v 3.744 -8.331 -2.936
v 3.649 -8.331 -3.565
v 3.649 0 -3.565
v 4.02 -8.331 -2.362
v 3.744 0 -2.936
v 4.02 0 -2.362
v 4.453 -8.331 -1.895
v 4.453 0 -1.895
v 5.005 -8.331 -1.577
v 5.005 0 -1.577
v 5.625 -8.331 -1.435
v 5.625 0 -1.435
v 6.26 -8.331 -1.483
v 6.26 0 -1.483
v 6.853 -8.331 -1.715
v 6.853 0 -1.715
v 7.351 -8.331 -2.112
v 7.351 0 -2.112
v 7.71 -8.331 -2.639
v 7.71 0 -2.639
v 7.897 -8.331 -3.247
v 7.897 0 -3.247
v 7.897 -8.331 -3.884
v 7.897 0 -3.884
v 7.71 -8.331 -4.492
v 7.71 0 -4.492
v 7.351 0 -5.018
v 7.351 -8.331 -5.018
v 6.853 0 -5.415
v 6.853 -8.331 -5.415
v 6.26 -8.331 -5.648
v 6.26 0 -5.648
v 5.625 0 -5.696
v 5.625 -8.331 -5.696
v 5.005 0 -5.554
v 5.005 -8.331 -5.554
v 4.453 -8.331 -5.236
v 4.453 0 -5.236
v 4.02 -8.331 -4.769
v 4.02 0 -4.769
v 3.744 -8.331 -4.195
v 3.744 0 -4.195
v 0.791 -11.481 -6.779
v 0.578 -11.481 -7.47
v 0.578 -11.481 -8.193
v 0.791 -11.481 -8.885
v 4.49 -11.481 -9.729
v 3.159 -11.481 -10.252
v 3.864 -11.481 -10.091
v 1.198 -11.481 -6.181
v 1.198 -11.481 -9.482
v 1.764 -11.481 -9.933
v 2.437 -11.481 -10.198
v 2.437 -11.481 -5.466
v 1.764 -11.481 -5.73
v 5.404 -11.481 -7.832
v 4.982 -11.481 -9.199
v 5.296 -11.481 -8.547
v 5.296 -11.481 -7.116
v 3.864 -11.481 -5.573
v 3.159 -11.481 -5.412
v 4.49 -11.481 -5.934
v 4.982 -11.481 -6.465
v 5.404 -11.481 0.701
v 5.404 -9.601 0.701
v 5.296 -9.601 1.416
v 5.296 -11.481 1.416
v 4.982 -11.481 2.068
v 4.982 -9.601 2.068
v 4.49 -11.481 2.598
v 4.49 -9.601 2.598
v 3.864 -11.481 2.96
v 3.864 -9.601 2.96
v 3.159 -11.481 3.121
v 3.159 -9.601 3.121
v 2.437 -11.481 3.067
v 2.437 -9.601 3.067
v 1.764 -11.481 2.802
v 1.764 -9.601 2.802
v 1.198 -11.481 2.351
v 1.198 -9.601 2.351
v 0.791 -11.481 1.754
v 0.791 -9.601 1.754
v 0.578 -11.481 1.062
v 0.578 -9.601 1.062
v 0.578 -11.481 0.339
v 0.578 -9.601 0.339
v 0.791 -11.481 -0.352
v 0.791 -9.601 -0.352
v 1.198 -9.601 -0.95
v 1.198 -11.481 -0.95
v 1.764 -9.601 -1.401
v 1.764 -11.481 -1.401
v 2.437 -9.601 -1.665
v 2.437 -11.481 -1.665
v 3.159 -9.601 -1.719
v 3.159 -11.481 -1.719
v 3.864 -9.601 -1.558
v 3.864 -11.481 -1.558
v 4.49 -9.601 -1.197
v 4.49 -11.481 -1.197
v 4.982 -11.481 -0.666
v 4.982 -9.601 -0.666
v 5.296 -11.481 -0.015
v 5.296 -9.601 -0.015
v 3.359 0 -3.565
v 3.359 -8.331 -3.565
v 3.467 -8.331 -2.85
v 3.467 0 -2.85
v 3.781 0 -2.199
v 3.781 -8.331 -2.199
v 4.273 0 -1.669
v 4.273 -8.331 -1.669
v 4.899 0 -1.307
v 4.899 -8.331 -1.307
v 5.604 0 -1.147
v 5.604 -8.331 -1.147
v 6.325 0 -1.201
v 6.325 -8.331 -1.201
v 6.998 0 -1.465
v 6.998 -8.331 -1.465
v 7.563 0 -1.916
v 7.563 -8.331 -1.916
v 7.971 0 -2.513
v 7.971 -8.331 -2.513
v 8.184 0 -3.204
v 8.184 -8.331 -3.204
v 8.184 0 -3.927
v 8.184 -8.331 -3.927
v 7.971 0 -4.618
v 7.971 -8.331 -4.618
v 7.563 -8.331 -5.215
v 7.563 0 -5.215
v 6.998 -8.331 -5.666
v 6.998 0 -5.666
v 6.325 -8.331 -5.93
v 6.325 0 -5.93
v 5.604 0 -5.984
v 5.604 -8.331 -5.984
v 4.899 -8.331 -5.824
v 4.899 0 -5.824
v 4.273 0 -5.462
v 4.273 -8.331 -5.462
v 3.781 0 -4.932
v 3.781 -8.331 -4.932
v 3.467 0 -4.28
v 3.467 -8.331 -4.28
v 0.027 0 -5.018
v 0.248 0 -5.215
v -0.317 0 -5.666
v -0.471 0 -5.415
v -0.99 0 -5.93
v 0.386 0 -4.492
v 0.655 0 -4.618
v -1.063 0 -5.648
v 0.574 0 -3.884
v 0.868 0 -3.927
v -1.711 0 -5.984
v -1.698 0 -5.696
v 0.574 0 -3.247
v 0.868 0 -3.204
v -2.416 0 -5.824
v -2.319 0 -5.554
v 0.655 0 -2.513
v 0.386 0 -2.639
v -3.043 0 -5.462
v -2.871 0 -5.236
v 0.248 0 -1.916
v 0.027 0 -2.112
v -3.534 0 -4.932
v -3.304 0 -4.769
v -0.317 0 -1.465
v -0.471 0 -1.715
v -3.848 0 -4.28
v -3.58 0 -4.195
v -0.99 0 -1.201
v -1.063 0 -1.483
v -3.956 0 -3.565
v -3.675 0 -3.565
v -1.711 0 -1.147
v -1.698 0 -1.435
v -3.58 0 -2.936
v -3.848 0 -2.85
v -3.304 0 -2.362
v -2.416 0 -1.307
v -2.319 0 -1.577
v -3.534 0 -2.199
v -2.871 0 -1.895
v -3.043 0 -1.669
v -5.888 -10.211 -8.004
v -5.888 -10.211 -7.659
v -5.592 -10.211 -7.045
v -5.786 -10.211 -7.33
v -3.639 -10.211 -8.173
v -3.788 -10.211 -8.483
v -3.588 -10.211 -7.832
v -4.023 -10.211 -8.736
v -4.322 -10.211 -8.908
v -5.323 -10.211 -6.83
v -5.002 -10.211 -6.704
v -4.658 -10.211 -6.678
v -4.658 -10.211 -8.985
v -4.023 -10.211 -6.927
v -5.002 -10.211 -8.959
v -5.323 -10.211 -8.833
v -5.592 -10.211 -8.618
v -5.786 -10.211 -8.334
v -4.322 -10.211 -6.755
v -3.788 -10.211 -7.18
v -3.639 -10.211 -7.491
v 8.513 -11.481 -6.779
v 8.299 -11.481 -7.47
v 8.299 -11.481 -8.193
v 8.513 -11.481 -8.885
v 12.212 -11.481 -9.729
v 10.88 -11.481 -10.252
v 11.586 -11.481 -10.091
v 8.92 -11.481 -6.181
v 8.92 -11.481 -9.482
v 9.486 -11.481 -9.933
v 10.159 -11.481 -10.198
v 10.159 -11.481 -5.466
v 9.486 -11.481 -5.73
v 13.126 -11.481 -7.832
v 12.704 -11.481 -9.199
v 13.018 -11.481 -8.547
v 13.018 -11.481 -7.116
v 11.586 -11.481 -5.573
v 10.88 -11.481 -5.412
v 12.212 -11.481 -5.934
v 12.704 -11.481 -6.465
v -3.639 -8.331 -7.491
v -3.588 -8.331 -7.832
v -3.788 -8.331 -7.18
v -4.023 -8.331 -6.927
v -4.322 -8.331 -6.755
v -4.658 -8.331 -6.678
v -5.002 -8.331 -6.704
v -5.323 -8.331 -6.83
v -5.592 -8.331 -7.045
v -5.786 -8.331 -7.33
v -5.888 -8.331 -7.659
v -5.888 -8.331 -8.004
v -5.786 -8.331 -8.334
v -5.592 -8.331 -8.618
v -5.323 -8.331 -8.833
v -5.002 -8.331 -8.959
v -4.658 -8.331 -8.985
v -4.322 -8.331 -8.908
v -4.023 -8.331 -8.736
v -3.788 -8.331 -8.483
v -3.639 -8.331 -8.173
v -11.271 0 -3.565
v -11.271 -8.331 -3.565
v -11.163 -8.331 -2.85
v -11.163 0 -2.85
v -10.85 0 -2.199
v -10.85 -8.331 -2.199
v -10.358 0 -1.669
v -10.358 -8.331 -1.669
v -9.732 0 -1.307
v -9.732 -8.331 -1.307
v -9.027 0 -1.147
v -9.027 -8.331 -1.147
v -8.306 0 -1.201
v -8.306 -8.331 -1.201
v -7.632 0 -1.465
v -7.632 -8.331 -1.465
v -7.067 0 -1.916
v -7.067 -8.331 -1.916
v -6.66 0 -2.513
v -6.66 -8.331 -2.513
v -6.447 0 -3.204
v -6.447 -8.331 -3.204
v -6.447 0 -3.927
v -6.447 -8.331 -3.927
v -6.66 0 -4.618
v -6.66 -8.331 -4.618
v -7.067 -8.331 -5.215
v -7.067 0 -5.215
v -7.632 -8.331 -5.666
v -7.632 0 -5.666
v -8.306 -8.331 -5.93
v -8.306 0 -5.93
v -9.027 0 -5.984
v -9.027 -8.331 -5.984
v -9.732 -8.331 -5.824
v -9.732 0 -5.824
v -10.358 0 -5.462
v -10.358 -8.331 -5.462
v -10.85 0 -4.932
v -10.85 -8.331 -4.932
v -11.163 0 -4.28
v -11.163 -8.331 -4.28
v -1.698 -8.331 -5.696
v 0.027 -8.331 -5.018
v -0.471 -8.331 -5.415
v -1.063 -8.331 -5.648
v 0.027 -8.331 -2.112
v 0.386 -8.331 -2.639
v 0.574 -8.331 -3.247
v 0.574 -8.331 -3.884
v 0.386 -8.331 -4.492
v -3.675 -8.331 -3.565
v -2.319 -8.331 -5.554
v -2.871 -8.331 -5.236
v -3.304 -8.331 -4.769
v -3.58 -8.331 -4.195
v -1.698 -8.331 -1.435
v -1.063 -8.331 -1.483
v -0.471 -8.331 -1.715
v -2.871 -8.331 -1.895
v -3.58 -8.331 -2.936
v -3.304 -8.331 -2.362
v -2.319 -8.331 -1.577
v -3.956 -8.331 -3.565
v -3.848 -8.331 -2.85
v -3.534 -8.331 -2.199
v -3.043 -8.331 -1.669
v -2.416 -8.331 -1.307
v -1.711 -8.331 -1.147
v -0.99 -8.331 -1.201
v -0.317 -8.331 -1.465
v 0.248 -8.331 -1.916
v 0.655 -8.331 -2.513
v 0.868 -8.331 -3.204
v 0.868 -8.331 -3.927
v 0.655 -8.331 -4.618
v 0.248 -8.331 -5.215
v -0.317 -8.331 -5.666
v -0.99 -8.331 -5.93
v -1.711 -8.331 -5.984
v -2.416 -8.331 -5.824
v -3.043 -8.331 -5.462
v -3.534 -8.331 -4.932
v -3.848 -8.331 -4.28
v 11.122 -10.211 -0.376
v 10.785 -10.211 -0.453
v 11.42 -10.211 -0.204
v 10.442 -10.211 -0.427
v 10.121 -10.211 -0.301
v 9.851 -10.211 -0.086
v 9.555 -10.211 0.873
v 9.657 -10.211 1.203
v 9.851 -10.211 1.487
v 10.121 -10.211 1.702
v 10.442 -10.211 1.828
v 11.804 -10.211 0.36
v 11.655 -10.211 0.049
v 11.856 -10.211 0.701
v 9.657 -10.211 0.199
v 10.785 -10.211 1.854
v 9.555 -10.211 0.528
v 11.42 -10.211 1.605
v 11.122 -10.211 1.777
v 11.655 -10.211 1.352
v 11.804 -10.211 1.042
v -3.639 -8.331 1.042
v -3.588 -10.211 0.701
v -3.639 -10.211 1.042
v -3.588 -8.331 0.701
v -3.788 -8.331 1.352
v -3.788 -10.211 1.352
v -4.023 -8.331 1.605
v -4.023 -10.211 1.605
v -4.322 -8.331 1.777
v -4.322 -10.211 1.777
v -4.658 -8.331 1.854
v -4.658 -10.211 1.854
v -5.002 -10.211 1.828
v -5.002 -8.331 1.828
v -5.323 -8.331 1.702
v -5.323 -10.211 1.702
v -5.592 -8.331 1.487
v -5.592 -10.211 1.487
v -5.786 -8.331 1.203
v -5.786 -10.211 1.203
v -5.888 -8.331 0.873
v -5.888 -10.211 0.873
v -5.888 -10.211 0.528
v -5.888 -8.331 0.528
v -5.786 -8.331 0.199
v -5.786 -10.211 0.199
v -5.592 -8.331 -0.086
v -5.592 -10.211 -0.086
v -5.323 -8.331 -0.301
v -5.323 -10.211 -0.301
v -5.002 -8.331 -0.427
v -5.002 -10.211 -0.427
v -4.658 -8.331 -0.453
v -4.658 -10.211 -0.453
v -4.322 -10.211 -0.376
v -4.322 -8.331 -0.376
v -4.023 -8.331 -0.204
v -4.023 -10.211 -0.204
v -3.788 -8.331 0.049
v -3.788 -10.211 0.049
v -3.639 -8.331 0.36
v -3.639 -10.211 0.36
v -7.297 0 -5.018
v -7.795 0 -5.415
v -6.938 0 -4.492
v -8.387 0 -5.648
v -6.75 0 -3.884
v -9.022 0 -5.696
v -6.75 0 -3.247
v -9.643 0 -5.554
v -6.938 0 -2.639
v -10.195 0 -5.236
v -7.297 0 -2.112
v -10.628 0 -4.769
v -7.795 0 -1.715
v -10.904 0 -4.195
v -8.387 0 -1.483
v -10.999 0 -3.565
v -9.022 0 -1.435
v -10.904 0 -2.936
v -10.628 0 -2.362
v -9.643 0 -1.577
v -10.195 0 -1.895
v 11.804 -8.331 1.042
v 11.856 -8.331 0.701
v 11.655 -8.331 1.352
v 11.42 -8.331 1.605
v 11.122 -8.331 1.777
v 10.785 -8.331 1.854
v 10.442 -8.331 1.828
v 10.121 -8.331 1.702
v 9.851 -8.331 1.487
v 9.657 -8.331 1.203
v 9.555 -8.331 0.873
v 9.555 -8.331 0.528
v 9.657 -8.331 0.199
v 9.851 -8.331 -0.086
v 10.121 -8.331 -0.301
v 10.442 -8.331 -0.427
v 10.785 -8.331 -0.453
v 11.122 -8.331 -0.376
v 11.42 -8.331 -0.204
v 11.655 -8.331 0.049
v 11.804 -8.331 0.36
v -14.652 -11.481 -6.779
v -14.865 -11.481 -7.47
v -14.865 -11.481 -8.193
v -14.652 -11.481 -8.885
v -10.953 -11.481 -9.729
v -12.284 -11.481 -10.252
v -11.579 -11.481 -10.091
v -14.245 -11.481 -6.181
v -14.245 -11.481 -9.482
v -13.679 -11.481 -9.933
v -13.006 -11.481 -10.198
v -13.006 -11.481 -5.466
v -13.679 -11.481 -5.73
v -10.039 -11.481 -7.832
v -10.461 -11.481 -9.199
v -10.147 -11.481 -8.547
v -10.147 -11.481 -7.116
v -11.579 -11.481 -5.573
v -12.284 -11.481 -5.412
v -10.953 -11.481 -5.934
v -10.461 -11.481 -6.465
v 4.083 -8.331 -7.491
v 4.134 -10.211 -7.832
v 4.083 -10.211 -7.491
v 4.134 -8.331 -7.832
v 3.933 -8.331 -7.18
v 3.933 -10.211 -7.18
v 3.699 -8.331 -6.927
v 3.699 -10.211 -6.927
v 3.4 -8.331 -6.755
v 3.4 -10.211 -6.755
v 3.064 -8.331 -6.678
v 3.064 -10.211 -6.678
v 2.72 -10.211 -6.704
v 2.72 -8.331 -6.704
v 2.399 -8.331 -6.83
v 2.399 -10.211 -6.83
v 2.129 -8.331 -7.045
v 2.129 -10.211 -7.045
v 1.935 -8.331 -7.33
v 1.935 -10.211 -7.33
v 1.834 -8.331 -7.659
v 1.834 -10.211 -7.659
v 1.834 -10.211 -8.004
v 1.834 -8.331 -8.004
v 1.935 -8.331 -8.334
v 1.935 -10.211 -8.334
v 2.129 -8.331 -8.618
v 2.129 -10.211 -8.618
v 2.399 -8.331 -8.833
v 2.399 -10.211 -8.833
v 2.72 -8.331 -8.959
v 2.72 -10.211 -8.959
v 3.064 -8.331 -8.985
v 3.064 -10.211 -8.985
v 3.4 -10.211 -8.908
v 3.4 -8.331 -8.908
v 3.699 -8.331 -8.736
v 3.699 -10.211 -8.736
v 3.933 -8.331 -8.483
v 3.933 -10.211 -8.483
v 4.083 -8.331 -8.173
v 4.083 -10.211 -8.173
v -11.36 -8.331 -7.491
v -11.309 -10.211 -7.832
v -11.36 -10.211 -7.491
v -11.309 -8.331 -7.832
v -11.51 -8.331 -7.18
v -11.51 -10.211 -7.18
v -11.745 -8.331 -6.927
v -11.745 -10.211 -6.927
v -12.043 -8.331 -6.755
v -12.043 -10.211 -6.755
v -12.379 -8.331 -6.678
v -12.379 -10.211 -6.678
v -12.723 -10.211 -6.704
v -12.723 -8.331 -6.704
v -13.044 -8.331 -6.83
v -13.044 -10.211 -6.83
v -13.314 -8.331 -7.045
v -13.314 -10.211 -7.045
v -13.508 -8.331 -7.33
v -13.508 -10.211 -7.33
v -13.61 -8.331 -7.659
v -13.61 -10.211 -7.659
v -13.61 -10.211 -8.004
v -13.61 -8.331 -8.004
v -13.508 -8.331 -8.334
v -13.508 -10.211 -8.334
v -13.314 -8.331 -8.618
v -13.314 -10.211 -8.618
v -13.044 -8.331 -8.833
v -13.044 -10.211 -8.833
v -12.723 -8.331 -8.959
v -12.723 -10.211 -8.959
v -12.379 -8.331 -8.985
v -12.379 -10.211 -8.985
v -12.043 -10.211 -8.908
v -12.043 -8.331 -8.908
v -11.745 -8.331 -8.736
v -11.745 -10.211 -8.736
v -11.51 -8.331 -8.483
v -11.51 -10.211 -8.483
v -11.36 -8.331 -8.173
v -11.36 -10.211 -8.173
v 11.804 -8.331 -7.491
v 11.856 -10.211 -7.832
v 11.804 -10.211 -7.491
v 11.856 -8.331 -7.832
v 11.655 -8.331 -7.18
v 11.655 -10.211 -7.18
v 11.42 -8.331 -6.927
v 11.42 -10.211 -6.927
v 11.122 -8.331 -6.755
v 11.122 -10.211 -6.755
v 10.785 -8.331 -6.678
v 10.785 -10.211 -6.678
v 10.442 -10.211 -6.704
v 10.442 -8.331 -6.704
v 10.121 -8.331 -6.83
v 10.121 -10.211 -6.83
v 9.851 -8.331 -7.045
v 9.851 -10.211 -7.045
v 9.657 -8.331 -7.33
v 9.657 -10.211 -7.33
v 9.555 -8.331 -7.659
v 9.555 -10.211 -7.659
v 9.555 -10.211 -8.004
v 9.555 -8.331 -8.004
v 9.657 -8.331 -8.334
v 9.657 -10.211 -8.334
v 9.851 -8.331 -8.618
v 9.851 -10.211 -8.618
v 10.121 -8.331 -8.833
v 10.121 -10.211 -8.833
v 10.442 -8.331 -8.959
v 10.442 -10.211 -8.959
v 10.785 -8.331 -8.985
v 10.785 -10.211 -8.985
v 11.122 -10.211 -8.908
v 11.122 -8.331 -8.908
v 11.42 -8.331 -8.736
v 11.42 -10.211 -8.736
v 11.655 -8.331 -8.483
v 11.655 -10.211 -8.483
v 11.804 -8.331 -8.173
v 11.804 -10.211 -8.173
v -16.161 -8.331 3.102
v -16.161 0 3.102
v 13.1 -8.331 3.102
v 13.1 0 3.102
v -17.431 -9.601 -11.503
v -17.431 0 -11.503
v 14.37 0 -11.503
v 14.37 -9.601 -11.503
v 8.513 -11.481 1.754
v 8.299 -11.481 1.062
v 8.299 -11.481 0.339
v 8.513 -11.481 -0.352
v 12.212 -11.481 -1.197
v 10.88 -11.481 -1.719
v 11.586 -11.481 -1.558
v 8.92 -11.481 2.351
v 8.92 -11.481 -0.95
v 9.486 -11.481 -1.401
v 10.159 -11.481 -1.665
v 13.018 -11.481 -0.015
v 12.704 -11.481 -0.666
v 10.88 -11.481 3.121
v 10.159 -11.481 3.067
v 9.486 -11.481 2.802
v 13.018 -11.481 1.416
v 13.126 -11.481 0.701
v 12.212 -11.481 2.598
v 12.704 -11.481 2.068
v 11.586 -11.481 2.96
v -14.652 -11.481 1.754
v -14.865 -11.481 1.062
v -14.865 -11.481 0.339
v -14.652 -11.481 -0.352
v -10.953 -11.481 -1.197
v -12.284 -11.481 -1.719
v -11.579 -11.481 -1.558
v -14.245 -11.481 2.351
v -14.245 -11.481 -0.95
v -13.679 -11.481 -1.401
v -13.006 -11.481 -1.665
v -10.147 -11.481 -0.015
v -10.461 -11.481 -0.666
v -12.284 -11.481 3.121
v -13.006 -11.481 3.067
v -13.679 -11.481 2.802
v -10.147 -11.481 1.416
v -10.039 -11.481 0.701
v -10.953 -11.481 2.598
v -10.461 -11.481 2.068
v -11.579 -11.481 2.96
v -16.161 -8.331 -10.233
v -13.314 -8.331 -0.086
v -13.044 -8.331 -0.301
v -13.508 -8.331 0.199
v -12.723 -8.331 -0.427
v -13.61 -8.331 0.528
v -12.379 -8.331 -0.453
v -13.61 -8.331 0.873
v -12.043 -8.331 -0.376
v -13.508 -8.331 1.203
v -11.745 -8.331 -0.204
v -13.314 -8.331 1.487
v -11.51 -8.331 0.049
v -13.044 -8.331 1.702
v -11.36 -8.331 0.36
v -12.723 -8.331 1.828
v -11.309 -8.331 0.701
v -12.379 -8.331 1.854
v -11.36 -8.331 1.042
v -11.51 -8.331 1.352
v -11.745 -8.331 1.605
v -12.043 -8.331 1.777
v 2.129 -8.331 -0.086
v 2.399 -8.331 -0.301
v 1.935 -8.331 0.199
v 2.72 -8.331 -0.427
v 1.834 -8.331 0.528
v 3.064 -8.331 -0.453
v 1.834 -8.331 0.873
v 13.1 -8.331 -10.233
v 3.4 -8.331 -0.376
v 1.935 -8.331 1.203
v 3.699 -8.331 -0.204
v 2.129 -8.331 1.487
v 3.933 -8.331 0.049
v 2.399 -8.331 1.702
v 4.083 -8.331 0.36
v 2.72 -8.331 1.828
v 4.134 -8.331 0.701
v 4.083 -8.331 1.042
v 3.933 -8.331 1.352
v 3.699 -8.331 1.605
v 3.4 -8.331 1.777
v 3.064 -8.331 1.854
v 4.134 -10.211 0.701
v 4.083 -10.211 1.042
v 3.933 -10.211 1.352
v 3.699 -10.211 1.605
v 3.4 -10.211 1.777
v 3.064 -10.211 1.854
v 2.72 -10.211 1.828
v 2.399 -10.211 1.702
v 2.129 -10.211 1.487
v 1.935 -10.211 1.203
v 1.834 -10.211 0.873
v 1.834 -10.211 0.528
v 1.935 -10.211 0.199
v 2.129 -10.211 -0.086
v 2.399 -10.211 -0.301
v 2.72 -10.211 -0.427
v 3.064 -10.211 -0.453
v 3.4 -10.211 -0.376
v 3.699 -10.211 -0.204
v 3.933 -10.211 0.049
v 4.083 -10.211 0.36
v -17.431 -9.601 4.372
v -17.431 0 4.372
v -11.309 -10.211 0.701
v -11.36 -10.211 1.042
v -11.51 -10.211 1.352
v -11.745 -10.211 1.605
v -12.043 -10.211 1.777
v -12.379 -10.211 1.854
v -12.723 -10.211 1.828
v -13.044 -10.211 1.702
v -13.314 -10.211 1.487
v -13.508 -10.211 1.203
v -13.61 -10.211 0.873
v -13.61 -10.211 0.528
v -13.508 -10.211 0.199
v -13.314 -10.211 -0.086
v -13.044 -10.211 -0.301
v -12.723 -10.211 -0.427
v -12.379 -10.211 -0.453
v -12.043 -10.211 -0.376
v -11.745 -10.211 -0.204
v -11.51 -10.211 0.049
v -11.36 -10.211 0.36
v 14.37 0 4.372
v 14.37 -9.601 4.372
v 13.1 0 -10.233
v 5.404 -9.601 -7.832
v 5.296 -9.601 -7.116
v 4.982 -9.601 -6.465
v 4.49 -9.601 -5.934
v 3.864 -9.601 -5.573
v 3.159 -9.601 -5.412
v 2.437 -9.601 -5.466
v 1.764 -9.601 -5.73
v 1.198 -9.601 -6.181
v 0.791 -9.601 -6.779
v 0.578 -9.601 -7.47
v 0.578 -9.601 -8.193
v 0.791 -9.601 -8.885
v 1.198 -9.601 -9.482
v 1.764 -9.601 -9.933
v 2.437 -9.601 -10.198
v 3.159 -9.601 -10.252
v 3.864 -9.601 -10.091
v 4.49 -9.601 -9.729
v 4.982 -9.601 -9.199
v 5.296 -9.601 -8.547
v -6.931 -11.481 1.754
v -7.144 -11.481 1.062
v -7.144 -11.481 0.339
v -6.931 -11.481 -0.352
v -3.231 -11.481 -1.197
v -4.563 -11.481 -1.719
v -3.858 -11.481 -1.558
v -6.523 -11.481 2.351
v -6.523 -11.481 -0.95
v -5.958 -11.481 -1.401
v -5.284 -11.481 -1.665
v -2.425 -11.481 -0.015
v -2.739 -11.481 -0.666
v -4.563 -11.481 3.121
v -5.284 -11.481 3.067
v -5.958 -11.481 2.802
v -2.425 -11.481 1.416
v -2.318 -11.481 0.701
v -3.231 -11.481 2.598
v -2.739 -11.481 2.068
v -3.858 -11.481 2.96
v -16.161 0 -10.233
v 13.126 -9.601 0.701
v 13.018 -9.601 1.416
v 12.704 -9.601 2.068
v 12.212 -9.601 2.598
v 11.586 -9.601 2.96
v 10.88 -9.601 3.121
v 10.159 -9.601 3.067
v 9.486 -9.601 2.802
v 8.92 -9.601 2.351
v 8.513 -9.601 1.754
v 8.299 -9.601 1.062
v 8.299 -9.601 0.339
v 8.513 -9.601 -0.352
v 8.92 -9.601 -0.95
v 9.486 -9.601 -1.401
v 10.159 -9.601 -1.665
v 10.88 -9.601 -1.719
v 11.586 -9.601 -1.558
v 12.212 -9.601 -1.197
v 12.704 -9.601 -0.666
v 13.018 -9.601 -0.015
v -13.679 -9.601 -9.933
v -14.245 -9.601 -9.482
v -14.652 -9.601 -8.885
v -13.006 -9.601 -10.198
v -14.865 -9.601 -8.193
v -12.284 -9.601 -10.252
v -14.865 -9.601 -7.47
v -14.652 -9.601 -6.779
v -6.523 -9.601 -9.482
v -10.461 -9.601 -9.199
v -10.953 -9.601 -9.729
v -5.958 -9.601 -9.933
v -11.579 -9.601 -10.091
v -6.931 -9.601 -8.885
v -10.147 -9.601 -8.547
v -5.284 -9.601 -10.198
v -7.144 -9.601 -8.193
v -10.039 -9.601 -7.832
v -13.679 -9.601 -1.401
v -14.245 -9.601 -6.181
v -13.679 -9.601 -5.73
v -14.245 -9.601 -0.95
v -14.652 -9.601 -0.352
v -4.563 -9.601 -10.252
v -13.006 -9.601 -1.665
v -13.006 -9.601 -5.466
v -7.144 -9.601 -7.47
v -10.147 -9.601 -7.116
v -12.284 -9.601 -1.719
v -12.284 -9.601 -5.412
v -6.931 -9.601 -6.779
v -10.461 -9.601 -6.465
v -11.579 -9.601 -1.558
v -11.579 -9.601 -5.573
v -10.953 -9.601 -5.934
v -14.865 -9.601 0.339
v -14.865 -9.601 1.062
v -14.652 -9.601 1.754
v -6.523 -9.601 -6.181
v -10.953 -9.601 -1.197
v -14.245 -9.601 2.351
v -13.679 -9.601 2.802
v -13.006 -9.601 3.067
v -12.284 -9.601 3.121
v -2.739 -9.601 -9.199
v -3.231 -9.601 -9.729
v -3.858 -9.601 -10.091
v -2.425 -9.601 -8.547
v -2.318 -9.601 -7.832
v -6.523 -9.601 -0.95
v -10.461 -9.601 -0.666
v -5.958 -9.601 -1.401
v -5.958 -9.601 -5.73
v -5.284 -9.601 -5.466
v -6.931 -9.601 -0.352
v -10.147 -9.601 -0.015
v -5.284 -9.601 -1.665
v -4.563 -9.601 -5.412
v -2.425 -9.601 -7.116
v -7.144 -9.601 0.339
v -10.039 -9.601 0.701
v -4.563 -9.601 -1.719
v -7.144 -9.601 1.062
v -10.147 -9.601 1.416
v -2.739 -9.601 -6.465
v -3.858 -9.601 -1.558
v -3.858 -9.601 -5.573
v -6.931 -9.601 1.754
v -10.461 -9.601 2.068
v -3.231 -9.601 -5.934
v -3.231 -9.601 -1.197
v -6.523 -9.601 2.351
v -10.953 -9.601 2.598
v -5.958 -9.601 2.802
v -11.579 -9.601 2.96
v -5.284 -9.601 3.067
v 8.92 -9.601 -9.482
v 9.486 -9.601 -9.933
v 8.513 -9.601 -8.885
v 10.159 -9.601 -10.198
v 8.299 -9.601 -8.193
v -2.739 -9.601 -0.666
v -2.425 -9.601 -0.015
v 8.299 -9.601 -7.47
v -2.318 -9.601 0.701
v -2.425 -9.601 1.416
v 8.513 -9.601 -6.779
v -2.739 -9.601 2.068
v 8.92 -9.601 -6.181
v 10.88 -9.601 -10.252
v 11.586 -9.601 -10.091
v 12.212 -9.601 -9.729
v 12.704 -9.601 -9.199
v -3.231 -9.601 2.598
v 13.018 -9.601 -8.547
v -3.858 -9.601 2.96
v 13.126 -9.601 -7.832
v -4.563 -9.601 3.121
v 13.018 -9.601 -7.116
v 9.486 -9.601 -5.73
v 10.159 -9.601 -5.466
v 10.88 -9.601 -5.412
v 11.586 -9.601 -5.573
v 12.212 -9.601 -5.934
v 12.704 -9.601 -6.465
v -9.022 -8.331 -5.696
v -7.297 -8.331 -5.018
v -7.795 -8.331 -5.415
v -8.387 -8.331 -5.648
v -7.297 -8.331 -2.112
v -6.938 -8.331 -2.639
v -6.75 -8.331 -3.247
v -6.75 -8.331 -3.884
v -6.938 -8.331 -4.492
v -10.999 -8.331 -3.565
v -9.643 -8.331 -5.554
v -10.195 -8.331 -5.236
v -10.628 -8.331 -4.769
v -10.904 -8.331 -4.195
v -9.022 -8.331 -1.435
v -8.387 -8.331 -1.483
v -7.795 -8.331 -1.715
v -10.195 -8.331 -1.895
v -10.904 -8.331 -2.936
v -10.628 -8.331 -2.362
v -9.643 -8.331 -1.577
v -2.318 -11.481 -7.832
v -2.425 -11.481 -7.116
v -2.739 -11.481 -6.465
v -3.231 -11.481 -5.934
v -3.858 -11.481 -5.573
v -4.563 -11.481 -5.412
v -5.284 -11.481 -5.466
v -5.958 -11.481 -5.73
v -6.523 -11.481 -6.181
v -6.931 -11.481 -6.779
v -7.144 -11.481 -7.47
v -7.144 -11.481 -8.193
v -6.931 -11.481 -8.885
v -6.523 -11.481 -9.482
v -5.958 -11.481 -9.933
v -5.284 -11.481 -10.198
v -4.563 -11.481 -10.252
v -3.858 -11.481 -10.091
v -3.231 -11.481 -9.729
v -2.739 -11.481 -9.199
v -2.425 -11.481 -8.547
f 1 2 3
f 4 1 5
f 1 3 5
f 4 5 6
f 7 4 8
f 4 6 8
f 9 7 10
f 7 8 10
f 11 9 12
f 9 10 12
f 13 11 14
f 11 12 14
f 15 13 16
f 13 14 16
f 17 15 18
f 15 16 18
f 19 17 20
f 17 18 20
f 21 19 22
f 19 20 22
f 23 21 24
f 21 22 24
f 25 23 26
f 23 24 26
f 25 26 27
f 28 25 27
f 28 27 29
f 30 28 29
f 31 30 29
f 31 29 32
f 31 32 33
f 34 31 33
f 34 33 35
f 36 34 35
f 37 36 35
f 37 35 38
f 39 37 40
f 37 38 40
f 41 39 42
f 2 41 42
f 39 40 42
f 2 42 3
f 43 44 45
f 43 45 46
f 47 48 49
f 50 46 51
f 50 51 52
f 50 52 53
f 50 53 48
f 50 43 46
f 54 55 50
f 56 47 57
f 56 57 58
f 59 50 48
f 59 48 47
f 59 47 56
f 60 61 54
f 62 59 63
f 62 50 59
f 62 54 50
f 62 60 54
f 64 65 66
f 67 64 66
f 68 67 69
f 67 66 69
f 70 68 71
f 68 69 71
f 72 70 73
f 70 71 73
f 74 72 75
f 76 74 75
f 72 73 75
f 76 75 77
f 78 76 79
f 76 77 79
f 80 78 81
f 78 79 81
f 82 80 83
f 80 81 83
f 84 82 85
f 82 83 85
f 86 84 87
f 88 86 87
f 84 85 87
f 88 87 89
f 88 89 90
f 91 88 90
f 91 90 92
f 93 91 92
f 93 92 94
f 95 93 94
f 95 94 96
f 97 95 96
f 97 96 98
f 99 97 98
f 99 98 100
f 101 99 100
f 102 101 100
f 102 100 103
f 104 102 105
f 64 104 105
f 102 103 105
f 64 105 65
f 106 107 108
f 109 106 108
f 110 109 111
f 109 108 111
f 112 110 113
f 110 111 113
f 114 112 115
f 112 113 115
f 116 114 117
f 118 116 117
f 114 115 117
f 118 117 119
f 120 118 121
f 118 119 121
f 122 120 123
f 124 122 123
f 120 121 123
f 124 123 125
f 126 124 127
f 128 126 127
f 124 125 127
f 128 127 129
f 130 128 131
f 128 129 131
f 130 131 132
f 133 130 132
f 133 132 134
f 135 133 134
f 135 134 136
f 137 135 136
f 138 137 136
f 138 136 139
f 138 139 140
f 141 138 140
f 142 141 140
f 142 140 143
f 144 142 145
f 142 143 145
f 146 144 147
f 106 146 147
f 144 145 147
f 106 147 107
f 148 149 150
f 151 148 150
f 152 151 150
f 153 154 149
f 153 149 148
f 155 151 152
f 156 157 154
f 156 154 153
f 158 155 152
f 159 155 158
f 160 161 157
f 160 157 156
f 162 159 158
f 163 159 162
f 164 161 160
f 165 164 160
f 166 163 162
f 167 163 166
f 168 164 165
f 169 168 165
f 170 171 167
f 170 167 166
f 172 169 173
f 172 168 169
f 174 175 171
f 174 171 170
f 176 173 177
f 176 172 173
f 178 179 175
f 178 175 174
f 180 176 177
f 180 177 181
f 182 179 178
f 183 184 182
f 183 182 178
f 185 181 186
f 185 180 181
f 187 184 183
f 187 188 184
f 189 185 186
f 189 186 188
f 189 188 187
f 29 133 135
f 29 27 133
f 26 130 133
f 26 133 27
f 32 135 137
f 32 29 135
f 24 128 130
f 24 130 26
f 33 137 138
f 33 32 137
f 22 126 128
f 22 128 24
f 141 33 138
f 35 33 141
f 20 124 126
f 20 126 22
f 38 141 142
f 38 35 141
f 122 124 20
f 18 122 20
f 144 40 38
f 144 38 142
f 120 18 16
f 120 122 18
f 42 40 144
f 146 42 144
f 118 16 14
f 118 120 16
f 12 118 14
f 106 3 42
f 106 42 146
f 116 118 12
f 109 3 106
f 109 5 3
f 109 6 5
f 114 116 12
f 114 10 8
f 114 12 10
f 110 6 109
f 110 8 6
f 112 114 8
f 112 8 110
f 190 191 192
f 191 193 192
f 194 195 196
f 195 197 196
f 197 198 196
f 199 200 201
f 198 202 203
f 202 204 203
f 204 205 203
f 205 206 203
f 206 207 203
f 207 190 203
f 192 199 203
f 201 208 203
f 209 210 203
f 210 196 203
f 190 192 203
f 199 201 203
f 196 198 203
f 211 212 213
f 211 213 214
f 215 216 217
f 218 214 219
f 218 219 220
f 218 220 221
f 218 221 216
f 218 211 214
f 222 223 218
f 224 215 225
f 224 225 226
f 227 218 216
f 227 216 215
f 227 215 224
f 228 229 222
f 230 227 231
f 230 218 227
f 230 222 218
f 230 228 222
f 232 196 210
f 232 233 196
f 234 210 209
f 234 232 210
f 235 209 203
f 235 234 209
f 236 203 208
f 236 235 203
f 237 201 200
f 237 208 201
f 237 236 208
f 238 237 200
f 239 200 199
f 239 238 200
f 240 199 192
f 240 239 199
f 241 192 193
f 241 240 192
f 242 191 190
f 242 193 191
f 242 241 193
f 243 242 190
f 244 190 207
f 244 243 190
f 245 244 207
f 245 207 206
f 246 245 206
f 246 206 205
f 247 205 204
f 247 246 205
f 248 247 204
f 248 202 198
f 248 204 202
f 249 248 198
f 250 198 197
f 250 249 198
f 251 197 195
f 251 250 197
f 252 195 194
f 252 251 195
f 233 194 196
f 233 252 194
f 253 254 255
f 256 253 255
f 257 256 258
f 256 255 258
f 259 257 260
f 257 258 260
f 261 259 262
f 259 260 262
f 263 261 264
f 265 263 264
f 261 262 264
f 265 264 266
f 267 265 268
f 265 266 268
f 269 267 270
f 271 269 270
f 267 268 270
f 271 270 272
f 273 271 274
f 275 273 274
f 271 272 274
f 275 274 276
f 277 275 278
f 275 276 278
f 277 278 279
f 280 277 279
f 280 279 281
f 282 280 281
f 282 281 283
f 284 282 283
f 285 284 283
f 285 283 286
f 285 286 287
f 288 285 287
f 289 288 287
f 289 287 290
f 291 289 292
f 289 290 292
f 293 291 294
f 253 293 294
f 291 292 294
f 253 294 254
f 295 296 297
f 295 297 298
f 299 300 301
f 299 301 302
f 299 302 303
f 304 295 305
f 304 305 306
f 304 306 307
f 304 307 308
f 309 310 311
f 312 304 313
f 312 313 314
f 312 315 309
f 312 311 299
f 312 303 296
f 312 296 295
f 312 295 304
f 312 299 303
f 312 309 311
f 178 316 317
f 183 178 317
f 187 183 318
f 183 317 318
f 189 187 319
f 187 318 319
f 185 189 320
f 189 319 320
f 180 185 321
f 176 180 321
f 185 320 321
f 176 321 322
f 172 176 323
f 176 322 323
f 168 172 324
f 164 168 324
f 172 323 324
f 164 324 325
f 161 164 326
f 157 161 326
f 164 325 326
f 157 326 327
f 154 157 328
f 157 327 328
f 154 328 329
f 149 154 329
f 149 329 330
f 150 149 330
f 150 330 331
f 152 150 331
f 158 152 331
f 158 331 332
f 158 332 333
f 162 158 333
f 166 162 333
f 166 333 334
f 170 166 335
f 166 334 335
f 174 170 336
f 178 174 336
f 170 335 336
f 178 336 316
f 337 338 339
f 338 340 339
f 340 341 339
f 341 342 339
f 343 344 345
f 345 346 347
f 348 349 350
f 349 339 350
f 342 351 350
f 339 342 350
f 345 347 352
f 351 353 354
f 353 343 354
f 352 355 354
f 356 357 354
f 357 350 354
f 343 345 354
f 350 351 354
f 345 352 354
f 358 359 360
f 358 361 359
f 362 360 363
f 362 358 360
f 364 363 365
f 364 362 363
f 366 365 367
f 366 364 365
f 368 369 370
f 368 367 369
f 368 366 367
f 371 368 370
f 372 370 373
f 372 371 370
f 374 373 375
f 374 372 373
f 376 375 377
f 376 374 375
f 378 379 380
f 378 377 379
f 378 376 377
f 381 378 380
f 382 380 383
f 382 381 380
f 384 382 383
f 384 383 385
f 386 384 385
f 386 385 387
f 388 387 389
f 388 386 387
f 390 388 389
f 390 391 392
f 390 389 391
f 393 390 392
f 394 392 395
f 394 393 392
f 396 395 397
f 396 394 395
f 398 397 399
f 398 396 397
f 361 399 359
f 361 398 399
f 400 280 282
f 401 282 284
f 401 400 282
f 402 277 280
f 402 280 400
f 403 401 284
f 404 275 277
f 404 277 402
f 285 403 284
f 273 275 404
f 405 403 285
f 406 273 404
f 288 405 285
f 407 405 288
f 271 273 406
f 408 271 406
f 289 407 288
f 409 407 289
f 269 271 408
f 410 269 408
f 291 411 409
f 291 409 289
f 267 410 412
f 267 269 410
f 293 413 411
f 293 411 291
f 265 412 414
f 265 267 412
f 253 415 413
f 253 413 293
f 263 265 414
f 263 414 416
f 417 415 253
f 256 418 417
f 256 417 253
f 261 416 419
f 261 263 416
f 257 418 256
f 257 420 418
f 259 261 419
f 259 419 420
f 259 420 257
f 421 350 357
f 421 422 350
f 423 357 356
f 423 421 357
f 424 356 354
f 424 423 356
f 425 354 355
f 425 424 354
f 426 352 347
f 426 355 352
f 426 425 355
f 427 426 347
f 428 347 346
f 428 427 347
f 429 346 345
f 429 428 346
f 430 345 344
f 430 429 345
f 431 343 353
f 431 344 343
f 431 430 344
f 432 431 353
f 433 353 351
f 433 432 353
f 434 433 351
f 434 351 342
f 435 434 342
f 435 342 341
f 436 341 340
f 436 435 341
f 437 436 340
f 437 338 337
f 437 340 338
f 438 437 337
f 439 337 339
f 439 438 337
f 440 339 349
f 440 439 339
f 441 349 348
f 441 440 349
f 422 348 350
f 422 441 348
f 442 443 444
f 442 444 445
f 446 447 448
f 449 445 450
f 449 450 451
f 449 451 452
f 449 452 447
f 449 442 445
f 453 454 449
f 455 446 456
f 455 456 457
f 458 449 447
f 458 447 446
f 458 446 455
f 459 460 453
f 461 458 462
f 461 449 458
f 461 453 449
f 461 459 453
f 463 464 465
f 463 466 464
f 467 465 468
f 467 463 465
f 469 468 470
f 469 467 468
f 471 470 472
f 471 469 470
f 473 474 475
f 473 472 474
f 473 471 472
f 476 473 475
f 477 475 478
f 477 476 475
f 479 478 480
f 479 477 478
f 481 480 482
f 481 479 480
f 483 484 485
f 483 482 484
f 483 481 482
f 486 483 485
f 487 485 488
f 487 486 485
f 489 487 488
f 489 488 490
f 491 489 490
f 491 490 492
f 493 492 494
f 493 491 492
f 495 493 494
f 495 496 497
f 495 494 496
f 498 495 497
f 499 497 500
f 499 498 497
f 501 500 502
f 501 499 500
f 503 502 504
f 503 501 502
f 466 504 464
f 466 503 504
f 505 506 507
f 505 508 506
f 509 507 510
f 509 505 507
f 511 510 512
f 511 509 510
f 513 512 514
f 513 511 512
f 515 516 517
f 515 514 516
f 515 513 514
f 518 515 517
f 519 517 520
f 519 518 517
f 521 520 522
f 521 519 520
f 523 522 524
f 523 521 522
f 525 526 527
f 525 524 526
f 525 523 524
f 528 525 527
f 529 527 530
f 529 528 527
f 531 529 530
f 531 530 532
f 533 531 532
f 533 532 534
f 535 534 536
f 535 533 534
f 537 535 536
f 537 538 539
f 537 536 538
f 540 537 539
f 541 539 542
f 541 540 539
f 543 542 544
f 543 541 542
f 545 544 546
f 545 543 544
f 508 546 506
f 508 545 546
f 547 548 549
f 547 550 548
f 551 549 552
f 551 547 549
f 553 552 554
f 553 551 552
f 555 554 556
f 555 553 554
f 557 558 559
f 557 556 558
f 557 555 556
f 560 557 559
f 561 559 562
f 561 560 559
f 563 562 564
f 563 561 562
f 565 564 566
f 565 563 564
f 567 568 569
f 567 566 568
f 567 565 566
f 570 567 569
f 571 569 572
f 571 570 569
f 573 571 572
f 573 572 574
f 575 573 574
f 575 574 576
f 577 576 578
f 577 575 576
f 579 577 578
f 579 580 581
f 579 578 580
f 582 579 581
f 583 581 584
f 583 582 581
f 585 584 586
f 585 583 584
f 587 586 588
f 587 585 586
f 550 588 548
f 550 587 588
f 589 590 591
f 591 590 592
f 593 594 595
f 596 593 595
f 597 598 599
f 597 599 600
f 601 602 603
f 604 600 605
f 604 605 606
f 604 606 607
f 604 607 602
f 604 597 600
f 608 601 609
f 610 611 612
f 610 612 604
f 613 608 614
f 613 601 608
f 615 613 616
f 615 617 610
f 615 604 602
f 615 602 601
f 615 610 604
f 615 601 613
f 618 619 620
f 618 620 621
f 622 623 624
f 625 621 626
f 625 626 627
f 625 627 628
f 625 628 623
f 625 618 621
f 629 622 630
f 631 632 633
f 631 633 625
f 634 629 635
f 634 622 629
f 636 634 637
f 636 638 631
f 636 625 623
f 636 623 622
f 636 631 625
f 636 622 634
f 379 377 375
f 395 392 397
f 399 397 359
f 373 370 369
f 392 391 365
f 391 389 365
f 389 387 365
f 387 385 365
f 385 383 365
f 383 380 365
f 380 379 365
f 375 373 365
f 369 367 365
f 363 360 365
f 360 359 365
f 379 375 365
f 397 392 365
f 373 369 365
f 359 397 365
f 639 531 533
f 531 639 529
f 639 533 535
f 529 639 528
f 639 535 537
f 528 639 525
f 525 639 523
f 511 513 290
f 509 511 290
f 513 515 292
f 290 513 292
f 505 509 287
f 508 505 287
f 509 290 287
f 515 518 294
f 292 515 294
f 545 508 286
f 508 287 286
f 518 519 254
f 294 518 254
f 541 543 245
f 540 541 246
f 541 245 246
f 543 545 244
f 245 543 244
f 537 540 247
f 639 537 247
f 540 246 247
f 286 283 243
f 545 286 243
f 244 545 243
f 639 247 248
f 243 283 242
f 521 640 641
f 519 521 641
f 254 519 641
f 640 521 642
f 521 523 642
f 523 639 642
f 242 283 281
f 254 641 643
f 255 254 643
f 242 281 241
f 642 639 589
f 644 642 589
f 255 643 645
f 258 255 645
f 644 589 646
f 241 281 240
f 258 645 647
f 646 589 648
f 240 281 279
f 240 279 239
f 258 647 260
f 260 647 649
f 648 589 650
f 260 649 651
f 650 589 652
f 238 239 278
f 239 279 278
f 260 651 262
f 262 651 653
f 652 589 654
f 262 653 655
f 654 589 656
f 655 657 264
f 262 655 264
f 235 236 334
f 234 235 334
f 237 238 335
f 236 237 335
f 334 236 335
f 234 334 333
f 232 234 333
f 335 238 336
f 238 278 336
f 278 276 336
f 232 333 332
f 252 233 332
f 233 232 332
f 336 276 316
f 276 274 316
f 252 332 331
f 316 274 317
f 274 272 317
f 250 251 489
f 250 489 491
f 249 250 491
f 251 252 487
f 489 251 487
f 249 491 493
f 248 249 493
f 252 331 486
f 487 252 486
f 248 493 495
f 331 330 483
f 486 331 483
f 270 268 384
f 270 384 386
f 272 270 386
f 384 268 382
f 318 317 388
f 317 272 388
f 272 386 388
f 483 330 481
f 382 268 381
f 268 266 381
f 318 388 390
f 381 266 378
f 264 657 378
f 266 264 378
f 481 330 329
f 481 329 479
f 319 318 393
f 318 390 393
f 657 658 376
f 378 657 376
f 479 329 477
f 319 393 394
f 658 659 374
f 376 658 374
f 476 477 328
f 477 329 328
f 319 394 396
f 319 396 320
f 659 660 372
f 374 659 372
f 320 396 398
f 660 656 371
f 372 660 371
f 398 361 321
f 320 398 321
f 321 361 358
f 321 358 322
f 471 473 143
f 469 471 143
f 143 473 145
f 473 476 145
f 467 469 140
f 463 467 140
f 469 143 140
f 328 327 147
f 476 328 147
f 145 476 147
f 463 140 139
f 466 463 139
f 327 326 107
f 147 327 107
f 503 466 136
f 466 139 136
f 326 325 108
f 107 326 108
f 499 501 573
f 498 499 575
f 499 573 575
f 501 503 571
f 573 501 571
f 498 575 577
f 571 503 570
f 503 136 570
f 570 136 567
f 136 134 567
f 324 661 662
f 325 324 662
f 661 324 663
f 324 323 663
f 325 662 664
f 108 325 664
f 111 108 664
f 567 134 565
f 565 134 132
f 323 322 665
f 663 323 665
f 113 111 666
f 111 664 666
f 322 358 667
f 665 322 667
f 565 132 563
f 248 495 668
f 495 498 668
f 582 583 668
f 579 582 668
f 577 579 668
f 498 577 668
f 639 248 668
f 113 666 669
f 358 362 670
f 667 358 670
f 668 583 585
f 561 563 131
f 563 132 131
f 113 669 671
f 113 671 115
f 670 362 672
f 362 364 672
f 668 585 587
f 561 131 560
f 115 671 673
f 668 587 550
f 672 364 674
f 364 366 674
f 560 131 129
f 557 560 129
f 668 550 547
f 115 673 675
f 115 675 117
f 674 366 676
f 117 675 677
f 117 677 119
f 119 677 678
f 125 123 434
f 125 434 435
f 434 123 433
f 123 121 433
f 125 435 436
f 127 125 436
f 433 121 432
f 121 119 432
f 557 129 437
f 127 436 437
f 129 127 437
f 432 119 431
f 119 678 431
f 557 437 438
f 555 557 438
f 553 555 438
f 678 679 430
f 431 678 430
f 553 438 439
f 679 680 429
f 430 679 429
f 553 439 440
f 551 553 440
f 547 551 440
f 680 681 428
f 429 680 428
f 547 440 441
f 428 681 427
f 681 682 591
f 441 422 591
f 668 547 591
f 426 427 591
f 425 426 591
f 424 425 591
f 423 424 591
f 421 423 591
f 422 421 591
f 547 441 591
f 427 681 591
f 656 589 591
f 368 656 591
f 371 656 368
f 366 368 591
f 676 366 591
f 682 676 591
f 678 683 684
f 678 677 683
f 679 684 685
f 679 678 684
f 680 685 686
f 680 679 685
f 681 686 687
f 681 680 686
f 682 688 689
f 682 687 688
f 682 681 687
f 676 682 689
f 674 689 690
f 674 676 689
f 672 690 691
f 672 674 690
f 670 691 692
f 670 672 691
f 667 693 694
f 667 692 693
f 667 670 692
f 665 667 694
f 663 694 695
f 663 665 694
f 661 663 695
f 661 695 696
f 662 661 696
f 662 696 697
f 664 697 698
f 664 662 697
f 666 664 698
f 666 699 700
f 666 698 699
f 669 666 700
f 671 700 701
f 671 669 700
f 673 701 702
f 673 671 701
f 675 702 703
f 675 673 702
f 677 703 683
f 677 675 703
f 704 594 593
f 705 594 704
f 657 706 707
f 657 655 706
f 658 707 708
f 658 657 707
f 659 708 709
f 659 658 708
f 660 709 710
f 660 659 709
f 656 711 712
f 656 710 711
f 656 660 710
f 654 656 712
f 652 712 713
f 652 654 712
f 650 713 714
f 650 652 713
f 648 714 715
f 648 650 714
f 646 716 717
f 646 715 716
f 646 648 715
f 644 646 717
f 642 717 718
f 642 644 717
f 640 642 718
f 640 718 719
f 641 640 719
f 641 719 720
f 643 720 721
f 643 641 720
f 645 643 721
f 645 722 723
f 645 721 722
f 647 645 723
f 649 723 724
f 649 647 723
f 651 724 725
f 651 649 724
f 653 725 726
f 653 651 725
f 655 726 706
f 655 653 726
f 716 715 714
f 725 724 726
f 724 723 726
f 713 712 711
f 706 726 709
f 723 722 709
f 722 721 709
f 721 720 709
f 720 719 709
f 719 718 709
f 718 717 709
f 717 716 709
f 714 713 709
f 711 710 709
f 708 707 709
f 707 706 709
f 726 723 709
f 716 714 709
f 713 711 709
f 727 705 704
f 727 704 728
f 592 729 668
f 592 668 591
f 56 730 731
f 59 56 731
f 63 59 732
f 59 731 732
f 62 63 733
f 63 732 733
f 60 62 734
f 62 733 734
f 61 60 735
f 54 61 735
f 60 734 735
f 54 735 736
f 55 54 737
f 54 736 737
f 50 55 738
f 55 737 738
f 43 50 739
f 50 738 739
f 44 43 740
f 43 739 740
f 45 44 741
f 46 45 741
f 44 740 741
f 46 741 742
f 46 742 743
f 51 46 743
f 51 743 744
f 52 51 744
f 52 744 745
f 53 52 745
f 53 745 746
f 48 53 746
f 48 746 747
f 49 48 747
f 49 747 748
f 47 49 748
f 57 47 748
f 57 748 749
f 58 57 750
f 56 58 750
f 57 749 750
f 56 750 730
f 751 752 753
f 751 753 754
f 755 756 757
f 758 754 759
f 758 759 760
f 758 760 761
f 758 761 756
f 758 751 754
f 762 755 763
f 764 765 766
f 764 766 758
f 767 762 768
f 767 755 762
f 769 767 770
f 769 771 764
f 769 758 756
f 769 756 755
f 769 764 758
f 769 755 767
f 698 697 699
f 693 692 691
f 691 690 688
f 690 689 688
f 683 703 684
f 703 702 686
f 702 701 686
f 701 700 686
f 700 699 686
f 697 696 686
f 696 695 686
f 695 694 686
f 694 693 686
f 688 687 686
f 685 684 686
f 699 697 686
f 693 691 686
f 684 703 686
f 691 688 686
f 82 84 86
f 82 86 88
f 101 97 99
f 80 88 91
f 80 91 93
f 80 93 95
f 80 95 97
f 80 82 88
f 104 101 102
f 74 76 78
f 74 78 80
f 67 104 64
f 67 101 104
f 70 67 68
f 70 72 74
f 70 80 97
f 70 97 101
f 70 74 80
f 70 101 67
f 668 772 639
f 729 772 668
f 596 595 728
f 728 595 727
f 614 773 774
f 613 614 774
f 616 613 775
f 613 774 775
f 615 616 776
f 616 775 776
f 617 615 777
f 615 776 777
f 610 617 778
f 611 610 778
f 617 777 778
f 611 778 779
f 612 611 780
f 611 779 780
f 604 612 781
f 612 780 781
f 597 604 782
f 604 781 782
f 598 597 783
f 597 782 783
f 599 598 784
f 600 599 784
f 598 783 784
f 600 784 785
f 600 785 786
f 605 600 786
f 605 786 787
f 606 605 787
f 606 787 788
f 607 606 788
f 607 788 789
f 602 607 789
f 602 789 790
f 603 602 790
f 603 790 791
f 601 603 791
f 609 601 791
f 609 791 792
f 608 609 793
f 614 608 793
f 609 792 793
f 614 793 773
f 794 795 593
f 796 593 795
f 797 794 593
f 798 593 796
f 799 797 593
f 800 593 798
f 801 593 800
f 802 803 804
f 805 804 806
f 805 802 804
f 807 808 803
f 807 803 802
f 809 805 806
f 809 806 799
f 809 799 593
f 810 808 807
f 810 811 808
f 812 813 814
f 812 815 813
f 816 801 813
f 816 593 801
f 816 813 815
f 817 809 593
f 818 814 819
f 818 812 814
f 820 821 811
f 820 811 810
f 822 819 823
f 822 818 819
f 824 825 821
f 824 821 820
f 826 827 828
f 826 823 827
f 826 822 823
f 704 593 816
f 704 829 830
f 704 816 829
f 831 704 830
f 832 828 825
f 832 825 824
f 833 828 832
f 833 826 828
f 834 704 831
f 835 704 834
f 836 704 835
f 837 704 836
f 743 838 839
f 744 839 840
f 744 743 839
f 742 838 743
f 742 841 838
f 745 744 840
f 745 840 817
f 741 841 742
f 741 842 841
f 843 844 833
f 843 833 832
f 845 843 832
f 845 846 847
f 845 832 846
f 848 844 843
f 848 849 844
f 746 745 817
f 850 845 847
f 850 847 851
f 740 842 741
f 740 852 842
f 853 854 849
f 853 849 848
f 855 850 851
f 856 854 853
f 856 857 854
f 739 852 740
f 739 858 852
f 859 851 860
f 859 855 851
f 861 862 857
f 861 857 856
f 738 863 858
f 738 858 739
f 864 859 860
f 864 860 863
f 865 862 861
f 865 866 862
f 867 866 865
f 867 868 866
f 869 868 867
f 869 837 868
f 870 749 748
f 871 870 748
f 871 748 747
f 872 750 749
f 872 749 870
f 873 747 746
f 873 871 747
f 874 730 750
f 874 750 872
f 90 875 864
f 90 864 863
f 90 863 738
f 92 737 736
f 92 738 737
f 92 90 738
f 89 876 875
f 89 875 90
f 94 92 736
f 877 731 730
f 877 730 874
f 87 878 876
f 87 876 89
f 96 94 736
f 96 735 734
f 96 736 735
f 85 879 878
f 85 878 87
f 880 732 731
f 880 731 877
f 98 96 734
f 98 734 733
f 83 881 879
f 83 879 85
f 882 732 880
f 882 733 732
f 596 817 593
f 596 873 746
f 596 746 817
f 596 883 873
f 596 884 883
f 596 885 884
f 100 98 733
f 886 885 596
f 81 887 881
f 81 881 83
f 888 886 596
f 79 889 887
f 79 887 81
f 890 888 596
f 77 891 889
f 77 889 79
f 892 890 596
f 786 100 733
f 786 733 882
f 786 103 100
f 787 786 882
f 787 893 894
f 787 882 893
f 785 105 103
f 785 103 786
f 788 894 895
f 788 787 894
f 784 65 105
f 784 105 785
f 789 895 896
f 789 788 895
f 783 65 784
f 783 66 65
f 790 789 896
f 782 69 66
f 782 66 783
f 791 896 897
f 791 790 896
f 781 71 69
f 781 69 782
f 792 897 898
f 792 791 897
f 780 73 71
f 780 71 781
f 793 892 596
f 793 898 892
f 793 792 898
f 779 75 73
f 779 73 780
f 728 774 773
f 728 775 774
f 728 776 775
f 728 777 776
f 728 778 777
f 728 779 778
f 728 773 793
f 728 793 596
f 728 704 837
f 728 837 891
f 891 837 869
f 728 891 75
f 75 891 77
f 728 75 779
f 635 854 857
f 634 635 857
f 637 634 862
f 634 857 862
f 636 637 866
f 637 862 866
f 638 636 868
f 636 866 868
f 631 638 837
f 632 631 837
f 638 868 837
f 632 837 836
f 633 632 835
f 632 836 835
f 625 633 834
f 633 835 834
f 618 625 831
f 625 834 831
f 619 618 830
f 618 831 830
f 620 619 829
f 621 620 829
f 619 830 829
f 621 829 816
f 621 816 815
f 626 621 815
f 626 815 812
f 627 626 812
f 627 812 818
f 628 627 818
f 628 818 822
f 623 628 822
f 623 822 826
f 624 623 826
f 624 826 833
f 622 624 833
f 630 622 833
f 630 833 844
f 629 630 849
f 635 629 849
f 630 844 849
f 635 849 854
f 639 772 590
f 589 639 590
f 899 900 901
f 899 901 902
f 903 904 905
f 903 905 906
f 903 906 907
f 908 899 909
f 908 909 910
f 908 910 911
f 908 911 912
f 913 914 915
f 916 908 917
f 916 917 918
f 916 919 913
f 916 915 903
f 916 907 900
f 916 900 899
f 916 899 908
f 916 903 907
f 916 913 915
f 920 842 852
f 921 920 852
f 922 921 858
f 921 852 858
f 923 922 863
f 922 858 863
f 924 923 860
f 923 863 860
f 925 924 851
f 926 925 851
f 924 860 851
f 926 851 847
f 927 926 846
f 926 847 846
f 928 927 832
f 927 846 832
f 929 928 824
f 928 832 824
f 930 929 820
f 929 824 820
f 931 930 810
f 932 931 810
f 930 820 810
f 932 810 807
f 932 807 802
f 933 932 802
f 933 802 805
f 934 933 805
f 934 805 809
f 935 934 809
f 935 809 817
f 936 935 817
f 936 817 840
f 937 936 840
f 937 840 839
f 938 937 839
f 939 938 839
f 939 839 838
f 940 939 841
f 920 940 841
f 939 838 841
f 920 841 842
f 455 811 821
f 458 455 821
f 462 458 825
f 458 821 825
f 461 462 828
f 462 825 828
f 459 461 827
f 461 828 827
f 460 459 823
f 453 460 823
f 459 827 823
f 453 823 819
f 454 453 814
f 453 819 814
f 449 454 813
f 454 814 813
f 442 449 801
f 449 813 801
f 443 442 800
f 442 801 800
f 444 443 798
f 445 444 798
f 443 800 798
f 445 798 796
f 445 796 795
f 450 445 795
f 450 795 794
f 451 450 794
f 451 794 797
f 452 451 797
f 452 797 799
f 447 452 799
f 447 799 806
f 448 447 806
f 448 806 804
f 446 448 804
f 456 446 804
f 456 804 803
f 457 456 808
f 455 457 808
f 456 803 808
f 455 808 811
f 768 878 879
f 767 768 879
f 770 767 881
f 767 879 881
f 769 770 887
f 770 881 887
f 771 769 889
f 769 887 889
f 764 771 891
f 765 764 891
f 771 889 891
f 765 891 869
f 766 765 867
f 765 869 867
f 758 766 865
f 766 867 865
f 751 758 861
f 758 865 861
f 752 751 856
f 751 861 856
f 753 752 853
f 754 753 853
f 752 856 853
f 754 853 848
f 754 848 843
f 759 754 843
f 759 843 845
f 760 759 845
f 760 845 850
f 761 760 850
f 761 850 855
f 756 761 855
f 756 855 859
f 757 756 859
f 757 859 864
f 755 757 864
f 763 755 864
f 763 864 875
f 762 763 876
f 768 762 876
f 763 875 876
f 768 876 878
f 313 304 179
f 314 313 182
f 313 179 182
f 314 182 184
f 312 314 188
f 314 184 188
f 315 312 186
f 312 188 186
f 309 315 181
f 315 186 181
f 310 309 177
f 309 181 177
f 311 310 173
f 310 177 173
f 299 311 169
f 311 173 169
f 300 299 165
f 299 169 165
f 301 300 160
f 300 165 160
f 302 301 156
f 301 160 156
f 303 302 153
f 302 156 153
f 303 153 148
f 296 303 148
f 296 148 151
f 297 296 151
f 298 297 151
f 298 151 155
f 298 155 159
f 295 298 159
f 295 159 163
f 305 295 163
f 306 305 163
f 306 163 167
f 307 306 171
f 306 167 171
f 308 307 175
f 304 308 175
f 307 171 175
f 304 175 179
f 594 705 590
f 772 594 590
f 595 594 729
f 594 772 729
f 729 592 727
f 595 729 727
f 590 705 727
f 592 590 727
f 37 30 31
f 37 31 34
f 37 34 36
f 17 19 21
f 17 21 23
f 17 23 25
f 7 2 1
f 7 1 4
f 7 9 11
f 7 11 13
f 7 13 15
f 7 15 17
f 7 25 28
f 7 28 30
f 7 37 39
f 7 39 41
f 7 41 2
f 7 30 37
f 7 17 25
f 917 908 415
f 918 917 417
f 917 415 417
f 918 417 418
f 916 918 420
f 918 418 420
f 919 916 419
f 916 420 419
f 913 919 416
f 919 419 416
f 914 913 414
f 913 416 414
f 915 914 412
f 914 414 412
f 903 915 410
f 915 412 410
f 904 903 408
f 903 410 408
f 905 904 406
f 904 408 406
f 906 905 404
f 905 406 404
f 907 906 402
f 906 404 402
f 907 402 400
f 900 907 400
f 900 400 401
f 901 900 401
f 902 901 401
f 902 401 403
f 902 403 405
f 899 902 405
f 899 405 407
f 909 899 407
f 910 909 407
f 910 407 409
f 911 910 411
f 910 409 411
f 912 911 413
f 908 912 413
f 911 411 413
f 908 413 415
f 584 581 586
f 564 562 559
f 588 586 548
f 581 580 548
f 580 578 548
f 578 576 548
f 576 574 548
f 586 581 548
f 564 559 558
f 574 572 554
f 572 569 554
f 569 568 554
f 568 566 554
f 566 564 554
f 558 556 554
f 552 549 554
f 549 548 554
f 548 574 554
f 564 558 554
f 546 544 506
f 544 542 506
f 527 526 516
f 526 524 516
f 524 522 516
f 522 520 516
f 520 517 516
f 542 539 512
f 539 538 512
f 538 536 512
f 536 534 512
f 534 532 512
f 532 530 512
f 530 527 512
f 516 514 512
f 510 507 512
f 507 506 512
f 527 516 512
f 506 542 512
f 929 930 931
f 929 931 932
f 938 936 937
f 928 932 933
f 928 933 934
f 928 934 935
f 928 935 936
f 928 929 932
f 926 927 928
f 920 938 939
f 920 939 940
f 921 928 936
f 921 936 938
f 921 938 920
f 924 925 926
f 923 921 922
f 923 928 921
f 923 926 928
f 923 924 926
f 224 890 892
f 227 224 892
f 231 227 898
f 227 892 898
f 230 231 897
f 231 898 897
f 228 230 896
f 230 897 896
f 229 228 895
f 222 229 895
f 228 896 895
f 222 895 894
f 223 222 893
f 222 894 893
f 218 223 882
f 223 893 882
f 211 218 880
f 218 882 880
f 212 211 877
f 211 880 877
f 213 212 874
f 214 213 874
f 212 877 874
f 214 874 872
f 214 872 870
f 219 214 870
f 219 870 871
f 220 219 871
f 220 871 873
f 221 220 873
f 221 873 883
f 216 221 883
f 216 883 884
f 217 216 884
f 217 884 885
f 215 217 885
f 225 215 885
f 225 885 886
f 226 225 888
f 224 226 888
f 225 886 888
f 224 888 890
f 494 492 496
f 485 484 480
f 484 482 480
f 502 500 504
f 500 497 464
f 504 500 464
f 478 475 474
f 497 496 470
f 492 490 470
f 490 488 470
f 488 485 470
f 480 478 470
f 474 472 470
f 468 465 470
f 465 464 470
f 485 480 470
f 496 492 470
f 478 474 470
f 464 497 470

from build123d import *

# Parameters (mm, degrees)
F0_W     = 31.8008
F0_H     = 15.875
F1_DEPTH = 9.6012
F2_R     = 2.4267031392
F3_DEPTH = 1.8796
F4_T     = -1.27
F5_R     = 2.4257
F6_DEPTH = 8.3312
F7_R     = 2.1361983008
F8_DEPTH = 8.3312


with BuildPart() as f1:
    # F0 (on Front) → F1 (new body)
    with BuildSketch(Plane.XZ):
        with Locations((-1.5301071107, -3.5654834016)):
            Rectangle(F0_W, F0_H)
    extrude(amount=F1_DEPTH)

    # F2 (on face) → F3 (join)
    with BuildSketch(Plane.XZ.offset(9.6012)):
        with Locations((10.6989897501, -7.8316802624)):
            Circle(F2_R)
        with Locations((2.9773897501, -7.8316802624)):
            Circle(F2_R)
        with Locations((-4.7442102499, -7.8316802624)):
            Circle(F2_R)
        with Locations((-12.4658102499, -7.8316802624)):
            Circle(F2_R)
        with Locations((2.9773897501, 0.7007134592)):
            Circle(F2_R)
        with Locations((-4.7442102499, 0.7007134592)):
            Circle(F2_R)
        with Locations((-12.4658102499, 0.7007134592)):
            Circle(F2_R)
        with Locations((10.6989897501, 0.7007134592)):
            Circle(F2_R)
    extrude(amount=F3_DEPTH)

    # F4
    f4_openings = [f1.faces().sort_by_distance(p)[0] for p in [
        (-1.530107, 0, -3.565483),
    ]]
    offset(amount=F4_T, openings=f4_openings, kind=Kind.INTERSECTION)

    # F5 (on face) → F6 (join, through all)
    with BuildSketch(Plane(origin=(0, -8.3312, 0), x_dir=(-1, 0, 0), z_dir=(0, 1, 0))):
        with Locations((1.5301071107, -3.5654834016)):
            Circle(F5_R)
        with Locations((8.8453071107, -3.5654834016)):
            Circle(F5_R)
        with Locations((-5.7850928893, -3.5654834016)):
            Circle(F5_R)
    extrude(amount=F6_DEPTH)

    # F7 (on face) → F8 (cut, through all)
    with BuildSketch(Plane(origin=(0, 0, 0), x_dir=(-1, 0, 0), z_dir=(0, 1, 0))):
        with Locations((-5.7850928893, -3.5654834016)):
            Circle(F7_R)
        with Locations((1.5387871107, -3.5654834016)):
            Circle(F7_R)
        with Locations((8.8626671107, -3.5654834016)):
            Circle(F7_R)
    extrude(amount=-F8_DEPTH, mode=Mode.SUBTRACT)


solid = f1.part
